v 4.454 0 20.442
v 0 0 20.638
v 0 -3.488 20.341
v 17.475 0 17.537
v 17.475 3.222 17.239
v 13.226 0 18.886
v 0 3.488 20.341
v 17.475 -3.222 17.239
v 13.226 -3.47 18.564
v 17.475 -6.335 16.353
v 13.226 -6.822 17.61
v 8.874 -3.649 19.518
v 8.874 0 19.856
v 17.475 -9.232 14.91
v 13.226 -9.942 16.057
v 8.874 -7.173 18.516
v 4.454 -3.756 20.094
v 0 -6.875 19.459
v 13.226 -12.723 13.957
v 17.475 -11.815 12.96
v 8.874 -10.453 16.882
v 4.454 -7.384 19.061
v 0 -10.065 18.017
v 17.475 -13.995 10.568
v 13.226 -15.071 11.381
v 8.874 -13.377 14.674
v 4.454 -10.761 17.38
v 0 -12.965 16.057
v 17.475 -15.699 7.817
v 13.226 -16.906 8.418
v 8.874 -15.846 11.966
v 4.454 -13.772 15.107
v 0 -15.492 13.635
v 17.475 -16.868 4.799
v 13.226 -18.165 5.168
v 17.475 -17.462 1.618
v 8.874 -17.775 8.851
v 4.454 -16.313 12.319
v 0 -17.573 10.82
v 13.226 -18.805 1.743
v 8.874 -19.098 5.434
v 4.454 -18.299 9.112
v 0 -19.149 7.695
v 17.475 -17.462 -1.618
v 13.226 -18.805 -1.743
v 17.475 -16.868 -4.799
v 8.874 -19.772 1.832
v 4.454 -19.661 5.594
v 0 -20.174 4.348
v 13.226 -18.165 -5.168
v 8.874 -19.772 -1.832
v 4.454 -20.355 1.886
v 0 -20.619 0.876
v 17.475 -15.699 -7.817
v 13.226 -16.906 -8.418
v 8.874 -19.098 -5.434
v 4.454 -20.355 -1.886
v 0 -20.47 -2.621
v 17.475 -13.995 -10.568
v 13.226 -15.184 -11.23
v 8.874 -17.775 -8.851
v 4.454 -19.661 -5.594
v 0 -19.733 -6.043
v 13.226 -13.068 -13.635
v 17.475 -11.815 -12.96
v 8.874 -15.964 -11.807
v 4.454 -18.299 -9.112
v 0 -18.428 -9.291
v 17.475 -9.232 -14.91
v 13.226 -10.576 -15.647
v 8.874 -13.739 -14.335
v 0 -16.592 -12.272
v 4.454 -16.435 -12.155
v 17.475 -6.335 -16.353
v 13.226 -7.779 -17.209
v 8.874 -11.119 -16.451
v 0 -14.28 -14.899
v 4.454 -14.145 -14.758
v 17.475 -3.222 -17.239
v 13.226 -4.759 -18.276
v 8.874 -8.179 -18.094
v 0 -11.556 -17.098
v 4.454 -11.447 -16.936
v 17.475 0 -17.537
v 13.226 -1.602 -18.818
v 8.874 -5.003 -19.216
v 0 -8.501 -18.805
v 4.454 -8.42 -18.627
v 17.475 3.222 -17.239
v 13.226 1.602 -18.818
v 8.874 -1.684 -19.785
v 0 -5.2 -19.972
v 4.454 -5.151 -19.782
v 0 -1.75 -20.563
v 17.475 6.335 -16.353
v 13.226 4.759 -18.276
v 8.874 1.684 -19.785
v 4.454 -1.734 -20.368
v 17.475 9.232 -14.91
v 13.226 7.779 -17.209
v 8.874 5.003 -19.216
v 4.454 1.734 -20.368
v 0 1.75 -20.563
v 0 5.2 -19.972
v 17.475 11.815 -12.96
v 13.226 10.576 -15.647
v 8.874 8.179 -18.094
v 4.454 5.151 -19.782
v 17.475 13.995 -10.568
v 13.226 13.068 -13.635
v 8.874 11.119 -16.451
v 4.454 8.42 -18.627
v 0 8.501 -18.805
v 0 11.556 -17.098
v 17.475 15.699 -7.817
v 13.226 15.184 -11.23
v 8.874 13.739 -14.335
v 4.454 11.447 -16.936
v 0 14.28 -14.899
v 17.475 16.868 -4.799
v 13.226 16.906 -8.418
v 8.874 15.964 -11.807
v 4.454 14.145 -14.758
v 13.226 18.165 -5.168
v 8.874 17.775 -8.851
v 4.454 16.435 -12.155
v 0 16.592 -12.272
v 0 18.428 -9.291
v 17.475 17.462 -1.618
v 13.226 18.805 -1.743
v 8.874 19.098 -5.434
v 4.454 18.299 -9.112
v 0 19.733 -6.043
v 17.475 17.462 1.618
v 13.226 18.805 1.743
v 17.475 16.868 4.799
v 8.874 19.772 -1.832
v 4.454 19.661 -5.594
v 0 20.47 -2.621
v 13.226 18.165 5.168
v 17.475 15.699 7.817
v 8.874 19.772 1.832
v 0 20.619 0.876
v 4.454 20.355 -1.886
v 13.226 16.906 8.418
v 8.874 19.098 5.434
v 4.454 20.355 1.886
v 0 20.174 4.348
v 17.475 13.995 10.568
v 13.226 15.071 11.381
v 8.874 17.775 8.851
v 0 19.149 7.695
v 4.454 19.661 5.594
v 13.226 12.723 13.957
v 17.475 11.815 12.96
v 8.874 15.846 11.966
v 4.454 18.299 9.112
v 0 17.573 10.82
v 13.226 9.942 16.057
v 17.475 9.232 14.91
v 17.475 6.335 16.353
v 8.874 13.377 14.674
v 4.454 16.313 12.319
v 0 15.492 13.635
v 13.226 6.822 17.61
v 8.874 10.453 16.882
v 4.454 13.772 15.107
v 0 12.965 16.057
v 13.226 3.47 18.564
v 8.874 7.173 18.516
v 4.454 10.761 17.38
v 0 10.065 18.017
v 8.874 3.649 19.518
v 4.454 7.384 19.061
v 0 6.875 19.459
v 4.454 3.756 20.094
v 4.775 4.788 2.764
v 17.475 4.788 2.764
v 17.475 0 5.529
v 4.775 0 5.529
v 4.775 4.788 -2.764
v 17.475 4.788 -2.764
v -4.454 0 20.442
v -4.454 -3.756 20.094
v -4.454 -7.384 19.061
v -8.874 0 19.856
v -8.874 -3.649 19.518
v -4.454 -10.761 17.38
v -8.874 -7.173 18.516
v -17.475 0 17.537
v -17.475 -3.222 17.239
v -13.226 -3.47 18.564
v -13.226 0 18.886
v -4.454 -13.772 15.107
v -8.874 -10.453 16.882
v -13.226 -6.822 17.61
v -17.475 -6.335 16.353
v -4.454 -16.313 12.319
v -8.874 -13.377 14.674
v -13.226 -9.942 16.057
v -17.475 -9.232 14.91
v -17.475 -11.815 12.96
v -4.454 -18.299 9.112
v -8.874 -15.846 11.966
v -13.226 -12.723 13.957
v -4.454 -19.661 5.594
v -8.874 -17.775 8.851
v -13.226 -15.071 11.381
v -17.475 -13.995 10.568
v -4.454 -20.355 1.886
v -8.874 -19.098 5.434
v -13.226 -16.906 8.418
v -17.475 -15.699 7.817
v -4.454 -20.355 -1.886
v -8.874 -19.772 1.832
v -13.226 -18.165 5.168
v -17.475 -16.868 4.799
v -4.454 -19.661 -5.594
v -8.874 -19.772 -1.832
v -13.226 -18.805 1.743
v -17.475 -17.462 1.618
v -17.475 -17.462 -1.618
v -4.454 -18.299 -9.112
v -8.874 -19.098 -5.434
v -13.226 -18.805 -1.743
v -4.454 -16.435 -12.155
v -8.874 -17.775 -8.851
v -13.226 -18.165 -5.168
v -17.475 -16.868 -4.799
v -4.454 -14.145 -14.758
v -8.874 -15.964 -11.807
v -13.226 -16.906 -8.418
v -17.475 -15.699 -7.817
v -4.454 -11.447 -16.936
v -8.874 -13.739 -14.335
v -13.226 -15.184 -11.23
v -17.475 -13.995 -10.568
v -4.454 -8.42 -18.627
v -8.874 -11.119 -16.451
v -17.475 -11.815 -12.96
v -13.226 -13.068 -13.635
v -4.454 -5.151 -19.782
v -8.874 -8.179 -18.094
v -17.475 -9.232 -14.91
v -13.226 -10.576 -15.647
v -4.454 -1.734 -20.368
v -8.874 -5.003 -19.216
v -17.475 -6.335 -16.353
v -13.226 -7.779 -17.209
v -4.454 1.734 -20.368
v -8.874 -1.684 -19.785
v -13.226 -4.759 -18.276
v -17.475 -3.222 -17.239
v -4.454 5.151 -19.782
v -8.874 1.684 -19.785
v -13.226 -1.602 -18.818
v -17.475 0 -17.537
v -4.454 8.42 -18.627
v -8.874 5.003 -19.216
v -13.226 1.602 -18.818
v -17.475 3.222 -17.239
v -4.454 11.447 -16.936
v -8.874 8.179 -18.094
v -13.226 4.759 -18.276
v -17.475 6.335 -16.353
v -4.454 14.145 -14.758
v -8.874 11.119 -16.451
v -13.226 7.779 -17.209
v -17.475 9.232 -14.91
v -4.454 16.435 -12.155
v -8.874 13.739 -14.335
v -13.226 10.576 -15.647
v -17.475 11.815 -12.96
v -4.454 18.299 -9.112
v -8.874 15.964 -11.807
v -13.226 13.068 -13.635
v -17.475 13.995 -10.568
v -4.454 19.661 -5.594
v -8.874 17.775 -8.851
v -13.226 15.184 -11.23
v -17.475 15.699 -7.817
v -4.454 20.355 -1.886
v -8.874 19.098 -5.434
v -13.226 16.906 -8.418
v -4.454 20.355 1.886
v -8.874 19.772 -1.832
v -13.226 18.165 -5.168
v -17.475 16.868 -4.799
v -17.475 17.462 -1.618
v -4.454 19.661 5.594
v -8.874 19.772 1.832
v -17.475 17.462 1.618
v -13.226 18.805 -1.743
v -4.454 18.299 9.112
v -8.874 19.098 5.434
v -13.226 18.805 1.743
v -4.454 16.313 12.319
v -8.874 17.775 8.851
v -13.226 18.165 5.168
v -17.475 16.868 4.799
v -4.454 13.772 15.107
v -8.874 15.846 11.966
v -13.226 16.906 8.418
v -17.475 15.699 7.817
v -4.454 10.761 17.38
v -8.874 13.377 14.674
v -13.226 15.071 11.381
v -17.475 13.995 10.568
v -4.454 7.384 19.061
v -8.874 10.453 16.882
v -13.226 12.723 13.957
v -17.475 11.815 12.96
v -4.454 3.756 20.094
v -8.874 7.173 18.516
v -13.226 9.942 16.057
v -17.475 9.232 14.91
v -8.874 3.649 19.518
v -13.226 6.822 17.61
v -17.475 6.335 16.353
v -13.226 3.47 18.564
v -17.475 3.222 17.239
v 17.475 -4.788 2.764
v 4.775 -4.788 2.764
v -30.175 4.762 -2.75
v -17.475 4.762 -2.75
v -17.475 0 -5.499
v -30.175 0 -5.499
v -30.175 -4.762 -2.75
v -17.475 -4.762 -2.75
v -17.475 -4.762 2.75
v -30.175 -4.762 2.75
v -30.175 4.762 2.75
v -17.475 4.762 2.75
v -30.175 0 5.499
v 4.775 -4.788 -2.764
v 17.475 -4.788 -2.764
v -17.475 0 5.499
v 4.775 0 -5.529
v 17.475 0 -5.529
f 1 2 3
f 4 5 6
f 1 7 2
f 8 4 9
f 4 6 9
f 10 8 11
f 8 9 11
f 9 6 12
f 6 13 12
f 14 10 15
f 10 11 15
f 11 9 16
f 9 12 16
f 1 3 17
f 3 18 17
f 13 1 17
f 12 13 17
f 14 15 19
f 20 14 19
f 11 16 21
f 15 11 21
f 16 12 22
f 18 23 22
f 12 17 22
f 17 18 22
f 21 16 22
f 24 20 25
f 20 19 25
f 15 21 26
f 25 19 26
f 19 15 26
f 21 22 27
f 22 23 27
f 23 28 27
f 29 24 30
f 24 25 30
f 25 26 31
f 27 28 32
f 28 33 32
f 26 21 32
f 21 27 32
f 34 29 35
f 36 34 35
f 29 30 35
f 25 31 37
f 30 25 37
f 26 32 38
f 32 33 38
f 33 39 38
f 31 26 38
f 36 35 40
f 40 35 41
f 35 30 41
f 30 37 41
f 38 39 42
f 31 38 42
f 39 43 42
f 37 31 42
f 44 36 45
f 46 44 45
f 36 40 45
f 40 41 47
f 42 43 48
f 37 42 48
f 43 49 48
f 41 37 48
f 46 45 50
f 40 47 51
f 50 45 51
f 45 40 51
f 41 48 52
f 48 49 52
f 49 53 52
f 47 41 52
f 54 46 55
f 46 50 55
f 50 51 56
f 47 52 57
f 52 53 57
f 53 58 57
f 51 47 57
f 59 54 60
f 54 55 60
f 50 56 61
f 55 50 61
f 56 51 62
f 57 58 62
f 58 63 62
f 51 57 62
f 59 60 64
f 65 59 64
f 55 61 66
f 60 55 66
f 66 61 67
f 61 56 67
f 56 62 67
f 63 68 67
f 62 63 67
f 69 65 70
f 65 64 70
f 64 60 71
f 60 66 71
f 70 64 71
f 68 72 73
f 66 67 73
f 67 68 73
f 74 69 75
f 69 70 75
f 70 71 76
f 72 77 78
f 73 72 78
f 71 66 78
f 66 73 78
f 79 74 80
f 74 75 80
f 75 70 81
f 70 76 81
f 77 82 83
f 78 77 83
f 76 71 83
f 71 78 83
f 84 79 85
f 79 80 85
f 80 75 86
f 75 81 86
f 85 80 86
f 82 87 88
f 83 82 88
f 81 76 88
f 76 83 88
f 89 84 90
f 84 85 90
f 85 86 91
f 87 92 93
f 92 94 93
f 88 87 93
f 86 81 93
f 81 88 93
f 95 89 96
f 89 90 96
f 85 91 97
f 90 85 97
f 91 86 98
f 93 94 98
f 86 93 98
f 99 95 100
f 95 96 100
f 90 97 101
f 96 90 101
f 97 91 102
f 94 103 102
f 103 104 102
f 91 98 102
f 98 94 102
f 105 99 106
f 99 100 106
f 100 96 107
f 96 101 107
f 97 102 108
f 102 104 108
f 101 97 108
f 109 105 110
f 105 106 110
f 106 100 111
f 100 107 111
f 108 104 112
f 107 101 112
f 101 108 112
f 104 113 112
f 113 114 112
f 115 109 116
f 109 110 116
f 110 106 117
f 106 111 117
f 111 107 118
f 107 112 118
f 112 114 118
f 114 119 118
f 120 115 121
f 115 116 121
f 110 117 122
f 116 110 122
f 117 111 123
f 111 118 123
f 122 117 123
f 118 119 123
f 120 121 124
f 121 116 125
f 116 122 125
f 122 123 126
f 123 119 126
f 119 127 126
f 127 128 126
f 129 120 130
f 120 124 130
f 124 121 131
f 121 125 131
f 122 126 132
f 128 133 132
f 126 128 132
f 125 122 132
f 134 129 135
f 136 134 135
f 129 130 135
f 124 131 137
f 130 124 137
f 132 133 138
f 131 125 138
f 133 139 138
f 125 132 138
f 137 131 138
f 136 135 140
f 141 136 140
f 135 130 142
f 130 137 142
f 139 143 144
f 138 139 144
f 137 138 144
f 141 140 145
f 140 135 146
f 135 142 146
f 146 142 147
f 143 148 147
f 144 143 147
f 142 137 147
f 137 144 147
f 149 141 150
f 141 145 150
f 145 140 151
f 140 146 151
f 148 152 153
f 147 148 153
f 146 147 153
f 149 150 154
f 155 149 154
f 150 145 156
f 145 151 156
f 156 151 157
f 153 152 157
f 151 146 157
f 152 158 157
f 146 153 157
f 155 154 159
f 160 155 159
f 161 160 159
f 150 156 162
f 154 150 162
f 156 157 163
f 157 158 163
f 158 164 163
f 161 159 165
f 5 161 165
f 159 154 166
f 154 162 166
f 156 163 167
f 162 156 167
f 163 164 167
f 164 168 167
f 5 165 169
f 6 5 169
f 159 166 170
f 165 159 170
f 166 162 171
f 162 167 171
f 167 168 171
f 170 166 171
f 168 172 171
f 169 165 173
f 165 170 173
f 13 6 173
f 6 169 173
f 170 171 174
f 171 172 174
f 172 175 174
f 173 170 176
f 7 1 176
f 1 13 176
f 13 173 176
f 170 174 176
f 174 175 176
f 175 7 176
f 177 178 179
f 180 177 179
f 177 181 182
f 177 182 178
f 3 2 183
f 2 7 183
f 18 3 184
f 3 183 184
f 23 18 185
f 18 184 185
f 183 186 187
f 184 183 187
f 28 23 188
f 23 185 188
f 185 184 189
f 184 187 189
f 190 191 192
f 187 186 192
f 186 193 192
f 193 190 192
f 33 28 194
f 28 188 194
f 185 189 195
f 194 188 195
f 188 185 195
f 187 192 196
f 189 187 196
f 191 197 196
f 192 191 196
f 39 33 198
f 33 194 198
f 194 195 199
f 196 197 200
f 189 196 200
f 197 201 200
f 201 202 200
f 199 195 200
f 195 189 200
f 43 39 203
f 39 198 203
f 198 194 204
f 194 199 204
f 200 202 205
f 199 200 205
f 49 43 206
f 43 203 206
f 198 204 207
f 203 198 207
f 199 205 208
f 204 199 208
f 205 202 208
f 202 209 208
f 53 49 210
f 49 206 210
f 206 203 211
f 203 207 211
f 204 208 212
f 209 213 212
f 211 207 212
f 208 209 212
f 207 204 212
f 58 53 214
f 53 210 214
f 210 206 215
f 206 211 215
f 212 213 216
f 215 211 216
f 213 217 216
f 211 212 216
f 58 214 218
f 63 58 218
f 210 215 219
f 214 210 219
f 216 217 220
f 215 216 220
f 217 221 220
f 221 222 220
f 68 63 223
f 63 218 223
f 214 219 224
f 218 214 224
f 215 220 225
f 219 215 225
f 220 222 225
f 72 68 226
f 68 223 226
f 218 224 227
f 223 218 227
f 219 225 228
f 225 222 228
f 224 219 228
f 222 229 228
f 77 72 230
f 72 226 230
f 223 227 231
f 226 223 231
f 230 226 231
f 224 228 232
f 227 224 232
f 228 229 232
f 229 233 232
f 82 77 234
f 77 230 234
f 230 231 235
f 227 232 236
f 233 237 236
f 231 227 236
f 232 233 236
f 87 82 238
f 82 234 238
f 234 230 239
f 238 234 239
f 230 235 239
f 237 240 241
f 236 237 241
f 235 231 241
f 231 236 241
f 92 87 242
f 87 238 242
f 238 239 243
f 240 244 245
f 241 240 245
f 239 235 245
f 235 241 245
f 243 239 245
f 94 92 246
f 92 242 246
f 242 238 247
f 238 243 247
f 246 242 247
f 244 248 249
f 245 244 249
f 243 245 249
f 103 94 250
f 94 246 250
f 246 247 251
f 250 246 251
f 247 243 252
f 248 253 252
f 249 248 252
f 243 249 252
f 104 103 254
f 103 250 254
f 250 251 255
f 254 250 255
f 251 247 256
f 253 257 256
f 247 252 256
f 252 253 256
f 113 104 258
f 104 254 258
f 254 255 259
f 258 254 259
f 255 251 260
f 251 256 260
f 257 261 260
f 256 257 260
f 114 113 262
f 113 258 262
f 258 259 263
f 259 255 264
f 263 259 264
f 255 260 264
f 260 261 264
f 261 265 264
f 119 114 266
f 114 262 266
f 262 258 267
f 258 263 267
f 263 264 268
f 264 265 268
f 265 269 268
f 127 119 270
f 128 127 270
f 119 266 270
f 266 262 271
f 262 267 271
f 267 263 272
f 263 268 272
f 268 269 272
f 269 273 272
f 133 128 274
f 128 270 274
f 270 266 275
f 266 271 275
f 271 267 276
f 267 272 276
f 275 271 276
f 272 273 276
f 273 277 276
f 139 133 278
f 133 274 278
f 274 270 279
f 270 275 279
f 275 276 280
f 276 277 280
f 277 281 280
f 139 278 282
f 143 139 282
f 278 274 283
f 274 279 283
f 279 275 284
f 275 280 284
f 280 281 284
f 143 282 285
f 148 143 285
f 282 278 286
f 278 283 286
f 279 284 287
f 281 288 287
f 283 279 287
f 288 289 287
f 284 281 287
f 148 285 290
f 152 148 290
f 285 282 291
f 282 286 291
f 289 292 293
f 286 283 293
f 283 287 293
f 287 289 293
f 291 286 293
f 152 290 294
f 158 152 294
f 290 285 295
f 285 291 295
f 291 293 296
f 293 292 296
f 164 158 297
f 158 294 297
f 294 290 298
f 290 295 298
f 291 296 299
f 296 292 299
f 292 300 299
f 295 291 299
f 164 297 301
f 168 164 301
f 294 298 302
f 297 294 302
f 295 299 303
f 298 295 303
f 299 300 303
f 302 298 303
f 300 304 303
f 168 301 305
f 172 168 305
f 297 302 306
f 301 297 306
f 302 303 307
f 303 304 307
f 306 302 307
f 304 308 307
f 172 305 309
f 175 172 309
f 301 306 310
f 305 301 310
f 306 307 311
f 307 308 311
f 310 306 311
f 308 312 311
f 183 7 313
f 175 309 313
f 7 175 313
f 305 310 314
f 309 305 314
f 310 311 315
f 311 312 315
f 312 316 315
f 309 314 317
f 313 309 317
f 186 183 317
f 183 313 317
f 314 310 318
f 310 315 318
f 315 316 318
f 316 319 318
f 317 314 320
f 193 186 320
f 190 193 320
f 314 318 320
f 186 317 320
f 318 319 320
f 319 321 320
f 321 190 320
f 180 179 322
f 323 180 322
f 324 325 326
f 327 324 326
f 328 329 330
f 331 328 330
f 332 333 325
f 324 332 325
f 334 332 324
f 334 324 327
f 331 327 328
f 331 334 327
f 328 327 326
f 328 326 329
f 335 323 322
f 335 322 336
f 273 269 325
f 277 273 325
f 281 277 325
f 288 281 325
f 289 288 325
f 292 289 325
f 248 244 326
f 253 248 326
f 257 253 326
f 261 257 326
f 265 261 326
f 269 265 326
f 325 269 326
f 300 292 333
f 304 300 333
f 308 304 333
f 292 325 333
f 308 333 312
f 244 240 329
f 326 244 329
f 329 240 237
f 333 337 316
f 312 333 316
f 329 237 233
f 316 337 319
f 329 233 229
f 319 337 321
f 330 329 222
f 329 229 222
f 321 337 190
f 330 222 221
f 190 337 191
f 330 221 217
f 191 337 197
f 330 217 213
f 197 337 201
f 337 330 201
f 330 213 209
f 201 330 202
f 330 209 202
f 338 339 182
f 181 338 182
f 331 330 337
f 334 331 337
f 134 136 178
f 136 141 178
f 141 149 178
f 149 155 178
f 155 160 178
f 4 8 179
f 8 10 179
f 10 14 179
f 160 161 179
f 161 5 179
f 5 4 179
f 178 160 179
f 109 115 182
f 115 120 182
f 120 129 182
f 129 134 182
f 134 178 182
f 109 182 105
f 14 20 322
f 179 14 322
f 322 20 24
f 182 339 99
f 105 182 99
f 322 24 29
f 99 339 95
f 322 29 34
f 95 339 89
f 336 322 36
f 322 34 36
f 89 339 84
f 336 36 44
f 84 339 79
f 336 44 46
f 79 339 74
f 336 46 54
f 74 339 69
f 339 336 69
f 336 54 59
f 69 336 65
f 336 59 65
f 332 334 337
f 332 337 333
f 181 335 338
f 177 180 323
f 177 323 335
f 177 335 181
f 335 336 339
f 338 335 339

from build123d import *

# Parameters (mm, degrees)
F3_DEPTH = 12.7
F5_DEPTH = 12.7


with BuildPart() as f1:
    # F0 (on Front) → F1 (revolve)
    with BuildSketch(Plane.XZ):
        with BuildLine():
            ThreePointArc((17.4752, 17.537158), (8.874046, 19.85641), (0, 20.6375))
            ThreePointArc((0, 20.6375), (-8.874046, 19.85641), (-17.4752, 17.537158))
            Line((-17.4752, 17.537158), (-17.4752, 0))
            Line((-17.4752, 0), (17.4752, 0))
            Line((17.4752, 0), (17.4752, 17.537158))
        make_face()
    revolve(axis=Axis((-4.40496, 0, 0), (1, 0, 0)))

    # F2 (on face) → F3 (cut)
    with BuildSketch(Plane.YZ.offset(17.4752)):
        Polygon((4.7879, -2.764295), (4.7879, 2.764295), (0, 5.528591), (-4.7879, 2.764295), (-4.7879, -2.764295), (0, -5.528591), align=None)
    extrude(amount=-F3_DEPTH, mode=Mode.SUBTRACT)

    # F4 (on face) → F5 (join)
    with BuildSketch(Plane(origin=(-17.4752, 0, 0), x_dir=(0, -1, 0), z_dir=(-1, 0, 0))):
        Polygon((4.7625, -2.749631), (4.7625, 2.749631), (0, 5.499261), (-4.7625, 2.749631), (-4.7625, -2.749631), (0, -5.499261), align=None)
    extrude(amount=F5_DEPTH)


solid = f1.part
